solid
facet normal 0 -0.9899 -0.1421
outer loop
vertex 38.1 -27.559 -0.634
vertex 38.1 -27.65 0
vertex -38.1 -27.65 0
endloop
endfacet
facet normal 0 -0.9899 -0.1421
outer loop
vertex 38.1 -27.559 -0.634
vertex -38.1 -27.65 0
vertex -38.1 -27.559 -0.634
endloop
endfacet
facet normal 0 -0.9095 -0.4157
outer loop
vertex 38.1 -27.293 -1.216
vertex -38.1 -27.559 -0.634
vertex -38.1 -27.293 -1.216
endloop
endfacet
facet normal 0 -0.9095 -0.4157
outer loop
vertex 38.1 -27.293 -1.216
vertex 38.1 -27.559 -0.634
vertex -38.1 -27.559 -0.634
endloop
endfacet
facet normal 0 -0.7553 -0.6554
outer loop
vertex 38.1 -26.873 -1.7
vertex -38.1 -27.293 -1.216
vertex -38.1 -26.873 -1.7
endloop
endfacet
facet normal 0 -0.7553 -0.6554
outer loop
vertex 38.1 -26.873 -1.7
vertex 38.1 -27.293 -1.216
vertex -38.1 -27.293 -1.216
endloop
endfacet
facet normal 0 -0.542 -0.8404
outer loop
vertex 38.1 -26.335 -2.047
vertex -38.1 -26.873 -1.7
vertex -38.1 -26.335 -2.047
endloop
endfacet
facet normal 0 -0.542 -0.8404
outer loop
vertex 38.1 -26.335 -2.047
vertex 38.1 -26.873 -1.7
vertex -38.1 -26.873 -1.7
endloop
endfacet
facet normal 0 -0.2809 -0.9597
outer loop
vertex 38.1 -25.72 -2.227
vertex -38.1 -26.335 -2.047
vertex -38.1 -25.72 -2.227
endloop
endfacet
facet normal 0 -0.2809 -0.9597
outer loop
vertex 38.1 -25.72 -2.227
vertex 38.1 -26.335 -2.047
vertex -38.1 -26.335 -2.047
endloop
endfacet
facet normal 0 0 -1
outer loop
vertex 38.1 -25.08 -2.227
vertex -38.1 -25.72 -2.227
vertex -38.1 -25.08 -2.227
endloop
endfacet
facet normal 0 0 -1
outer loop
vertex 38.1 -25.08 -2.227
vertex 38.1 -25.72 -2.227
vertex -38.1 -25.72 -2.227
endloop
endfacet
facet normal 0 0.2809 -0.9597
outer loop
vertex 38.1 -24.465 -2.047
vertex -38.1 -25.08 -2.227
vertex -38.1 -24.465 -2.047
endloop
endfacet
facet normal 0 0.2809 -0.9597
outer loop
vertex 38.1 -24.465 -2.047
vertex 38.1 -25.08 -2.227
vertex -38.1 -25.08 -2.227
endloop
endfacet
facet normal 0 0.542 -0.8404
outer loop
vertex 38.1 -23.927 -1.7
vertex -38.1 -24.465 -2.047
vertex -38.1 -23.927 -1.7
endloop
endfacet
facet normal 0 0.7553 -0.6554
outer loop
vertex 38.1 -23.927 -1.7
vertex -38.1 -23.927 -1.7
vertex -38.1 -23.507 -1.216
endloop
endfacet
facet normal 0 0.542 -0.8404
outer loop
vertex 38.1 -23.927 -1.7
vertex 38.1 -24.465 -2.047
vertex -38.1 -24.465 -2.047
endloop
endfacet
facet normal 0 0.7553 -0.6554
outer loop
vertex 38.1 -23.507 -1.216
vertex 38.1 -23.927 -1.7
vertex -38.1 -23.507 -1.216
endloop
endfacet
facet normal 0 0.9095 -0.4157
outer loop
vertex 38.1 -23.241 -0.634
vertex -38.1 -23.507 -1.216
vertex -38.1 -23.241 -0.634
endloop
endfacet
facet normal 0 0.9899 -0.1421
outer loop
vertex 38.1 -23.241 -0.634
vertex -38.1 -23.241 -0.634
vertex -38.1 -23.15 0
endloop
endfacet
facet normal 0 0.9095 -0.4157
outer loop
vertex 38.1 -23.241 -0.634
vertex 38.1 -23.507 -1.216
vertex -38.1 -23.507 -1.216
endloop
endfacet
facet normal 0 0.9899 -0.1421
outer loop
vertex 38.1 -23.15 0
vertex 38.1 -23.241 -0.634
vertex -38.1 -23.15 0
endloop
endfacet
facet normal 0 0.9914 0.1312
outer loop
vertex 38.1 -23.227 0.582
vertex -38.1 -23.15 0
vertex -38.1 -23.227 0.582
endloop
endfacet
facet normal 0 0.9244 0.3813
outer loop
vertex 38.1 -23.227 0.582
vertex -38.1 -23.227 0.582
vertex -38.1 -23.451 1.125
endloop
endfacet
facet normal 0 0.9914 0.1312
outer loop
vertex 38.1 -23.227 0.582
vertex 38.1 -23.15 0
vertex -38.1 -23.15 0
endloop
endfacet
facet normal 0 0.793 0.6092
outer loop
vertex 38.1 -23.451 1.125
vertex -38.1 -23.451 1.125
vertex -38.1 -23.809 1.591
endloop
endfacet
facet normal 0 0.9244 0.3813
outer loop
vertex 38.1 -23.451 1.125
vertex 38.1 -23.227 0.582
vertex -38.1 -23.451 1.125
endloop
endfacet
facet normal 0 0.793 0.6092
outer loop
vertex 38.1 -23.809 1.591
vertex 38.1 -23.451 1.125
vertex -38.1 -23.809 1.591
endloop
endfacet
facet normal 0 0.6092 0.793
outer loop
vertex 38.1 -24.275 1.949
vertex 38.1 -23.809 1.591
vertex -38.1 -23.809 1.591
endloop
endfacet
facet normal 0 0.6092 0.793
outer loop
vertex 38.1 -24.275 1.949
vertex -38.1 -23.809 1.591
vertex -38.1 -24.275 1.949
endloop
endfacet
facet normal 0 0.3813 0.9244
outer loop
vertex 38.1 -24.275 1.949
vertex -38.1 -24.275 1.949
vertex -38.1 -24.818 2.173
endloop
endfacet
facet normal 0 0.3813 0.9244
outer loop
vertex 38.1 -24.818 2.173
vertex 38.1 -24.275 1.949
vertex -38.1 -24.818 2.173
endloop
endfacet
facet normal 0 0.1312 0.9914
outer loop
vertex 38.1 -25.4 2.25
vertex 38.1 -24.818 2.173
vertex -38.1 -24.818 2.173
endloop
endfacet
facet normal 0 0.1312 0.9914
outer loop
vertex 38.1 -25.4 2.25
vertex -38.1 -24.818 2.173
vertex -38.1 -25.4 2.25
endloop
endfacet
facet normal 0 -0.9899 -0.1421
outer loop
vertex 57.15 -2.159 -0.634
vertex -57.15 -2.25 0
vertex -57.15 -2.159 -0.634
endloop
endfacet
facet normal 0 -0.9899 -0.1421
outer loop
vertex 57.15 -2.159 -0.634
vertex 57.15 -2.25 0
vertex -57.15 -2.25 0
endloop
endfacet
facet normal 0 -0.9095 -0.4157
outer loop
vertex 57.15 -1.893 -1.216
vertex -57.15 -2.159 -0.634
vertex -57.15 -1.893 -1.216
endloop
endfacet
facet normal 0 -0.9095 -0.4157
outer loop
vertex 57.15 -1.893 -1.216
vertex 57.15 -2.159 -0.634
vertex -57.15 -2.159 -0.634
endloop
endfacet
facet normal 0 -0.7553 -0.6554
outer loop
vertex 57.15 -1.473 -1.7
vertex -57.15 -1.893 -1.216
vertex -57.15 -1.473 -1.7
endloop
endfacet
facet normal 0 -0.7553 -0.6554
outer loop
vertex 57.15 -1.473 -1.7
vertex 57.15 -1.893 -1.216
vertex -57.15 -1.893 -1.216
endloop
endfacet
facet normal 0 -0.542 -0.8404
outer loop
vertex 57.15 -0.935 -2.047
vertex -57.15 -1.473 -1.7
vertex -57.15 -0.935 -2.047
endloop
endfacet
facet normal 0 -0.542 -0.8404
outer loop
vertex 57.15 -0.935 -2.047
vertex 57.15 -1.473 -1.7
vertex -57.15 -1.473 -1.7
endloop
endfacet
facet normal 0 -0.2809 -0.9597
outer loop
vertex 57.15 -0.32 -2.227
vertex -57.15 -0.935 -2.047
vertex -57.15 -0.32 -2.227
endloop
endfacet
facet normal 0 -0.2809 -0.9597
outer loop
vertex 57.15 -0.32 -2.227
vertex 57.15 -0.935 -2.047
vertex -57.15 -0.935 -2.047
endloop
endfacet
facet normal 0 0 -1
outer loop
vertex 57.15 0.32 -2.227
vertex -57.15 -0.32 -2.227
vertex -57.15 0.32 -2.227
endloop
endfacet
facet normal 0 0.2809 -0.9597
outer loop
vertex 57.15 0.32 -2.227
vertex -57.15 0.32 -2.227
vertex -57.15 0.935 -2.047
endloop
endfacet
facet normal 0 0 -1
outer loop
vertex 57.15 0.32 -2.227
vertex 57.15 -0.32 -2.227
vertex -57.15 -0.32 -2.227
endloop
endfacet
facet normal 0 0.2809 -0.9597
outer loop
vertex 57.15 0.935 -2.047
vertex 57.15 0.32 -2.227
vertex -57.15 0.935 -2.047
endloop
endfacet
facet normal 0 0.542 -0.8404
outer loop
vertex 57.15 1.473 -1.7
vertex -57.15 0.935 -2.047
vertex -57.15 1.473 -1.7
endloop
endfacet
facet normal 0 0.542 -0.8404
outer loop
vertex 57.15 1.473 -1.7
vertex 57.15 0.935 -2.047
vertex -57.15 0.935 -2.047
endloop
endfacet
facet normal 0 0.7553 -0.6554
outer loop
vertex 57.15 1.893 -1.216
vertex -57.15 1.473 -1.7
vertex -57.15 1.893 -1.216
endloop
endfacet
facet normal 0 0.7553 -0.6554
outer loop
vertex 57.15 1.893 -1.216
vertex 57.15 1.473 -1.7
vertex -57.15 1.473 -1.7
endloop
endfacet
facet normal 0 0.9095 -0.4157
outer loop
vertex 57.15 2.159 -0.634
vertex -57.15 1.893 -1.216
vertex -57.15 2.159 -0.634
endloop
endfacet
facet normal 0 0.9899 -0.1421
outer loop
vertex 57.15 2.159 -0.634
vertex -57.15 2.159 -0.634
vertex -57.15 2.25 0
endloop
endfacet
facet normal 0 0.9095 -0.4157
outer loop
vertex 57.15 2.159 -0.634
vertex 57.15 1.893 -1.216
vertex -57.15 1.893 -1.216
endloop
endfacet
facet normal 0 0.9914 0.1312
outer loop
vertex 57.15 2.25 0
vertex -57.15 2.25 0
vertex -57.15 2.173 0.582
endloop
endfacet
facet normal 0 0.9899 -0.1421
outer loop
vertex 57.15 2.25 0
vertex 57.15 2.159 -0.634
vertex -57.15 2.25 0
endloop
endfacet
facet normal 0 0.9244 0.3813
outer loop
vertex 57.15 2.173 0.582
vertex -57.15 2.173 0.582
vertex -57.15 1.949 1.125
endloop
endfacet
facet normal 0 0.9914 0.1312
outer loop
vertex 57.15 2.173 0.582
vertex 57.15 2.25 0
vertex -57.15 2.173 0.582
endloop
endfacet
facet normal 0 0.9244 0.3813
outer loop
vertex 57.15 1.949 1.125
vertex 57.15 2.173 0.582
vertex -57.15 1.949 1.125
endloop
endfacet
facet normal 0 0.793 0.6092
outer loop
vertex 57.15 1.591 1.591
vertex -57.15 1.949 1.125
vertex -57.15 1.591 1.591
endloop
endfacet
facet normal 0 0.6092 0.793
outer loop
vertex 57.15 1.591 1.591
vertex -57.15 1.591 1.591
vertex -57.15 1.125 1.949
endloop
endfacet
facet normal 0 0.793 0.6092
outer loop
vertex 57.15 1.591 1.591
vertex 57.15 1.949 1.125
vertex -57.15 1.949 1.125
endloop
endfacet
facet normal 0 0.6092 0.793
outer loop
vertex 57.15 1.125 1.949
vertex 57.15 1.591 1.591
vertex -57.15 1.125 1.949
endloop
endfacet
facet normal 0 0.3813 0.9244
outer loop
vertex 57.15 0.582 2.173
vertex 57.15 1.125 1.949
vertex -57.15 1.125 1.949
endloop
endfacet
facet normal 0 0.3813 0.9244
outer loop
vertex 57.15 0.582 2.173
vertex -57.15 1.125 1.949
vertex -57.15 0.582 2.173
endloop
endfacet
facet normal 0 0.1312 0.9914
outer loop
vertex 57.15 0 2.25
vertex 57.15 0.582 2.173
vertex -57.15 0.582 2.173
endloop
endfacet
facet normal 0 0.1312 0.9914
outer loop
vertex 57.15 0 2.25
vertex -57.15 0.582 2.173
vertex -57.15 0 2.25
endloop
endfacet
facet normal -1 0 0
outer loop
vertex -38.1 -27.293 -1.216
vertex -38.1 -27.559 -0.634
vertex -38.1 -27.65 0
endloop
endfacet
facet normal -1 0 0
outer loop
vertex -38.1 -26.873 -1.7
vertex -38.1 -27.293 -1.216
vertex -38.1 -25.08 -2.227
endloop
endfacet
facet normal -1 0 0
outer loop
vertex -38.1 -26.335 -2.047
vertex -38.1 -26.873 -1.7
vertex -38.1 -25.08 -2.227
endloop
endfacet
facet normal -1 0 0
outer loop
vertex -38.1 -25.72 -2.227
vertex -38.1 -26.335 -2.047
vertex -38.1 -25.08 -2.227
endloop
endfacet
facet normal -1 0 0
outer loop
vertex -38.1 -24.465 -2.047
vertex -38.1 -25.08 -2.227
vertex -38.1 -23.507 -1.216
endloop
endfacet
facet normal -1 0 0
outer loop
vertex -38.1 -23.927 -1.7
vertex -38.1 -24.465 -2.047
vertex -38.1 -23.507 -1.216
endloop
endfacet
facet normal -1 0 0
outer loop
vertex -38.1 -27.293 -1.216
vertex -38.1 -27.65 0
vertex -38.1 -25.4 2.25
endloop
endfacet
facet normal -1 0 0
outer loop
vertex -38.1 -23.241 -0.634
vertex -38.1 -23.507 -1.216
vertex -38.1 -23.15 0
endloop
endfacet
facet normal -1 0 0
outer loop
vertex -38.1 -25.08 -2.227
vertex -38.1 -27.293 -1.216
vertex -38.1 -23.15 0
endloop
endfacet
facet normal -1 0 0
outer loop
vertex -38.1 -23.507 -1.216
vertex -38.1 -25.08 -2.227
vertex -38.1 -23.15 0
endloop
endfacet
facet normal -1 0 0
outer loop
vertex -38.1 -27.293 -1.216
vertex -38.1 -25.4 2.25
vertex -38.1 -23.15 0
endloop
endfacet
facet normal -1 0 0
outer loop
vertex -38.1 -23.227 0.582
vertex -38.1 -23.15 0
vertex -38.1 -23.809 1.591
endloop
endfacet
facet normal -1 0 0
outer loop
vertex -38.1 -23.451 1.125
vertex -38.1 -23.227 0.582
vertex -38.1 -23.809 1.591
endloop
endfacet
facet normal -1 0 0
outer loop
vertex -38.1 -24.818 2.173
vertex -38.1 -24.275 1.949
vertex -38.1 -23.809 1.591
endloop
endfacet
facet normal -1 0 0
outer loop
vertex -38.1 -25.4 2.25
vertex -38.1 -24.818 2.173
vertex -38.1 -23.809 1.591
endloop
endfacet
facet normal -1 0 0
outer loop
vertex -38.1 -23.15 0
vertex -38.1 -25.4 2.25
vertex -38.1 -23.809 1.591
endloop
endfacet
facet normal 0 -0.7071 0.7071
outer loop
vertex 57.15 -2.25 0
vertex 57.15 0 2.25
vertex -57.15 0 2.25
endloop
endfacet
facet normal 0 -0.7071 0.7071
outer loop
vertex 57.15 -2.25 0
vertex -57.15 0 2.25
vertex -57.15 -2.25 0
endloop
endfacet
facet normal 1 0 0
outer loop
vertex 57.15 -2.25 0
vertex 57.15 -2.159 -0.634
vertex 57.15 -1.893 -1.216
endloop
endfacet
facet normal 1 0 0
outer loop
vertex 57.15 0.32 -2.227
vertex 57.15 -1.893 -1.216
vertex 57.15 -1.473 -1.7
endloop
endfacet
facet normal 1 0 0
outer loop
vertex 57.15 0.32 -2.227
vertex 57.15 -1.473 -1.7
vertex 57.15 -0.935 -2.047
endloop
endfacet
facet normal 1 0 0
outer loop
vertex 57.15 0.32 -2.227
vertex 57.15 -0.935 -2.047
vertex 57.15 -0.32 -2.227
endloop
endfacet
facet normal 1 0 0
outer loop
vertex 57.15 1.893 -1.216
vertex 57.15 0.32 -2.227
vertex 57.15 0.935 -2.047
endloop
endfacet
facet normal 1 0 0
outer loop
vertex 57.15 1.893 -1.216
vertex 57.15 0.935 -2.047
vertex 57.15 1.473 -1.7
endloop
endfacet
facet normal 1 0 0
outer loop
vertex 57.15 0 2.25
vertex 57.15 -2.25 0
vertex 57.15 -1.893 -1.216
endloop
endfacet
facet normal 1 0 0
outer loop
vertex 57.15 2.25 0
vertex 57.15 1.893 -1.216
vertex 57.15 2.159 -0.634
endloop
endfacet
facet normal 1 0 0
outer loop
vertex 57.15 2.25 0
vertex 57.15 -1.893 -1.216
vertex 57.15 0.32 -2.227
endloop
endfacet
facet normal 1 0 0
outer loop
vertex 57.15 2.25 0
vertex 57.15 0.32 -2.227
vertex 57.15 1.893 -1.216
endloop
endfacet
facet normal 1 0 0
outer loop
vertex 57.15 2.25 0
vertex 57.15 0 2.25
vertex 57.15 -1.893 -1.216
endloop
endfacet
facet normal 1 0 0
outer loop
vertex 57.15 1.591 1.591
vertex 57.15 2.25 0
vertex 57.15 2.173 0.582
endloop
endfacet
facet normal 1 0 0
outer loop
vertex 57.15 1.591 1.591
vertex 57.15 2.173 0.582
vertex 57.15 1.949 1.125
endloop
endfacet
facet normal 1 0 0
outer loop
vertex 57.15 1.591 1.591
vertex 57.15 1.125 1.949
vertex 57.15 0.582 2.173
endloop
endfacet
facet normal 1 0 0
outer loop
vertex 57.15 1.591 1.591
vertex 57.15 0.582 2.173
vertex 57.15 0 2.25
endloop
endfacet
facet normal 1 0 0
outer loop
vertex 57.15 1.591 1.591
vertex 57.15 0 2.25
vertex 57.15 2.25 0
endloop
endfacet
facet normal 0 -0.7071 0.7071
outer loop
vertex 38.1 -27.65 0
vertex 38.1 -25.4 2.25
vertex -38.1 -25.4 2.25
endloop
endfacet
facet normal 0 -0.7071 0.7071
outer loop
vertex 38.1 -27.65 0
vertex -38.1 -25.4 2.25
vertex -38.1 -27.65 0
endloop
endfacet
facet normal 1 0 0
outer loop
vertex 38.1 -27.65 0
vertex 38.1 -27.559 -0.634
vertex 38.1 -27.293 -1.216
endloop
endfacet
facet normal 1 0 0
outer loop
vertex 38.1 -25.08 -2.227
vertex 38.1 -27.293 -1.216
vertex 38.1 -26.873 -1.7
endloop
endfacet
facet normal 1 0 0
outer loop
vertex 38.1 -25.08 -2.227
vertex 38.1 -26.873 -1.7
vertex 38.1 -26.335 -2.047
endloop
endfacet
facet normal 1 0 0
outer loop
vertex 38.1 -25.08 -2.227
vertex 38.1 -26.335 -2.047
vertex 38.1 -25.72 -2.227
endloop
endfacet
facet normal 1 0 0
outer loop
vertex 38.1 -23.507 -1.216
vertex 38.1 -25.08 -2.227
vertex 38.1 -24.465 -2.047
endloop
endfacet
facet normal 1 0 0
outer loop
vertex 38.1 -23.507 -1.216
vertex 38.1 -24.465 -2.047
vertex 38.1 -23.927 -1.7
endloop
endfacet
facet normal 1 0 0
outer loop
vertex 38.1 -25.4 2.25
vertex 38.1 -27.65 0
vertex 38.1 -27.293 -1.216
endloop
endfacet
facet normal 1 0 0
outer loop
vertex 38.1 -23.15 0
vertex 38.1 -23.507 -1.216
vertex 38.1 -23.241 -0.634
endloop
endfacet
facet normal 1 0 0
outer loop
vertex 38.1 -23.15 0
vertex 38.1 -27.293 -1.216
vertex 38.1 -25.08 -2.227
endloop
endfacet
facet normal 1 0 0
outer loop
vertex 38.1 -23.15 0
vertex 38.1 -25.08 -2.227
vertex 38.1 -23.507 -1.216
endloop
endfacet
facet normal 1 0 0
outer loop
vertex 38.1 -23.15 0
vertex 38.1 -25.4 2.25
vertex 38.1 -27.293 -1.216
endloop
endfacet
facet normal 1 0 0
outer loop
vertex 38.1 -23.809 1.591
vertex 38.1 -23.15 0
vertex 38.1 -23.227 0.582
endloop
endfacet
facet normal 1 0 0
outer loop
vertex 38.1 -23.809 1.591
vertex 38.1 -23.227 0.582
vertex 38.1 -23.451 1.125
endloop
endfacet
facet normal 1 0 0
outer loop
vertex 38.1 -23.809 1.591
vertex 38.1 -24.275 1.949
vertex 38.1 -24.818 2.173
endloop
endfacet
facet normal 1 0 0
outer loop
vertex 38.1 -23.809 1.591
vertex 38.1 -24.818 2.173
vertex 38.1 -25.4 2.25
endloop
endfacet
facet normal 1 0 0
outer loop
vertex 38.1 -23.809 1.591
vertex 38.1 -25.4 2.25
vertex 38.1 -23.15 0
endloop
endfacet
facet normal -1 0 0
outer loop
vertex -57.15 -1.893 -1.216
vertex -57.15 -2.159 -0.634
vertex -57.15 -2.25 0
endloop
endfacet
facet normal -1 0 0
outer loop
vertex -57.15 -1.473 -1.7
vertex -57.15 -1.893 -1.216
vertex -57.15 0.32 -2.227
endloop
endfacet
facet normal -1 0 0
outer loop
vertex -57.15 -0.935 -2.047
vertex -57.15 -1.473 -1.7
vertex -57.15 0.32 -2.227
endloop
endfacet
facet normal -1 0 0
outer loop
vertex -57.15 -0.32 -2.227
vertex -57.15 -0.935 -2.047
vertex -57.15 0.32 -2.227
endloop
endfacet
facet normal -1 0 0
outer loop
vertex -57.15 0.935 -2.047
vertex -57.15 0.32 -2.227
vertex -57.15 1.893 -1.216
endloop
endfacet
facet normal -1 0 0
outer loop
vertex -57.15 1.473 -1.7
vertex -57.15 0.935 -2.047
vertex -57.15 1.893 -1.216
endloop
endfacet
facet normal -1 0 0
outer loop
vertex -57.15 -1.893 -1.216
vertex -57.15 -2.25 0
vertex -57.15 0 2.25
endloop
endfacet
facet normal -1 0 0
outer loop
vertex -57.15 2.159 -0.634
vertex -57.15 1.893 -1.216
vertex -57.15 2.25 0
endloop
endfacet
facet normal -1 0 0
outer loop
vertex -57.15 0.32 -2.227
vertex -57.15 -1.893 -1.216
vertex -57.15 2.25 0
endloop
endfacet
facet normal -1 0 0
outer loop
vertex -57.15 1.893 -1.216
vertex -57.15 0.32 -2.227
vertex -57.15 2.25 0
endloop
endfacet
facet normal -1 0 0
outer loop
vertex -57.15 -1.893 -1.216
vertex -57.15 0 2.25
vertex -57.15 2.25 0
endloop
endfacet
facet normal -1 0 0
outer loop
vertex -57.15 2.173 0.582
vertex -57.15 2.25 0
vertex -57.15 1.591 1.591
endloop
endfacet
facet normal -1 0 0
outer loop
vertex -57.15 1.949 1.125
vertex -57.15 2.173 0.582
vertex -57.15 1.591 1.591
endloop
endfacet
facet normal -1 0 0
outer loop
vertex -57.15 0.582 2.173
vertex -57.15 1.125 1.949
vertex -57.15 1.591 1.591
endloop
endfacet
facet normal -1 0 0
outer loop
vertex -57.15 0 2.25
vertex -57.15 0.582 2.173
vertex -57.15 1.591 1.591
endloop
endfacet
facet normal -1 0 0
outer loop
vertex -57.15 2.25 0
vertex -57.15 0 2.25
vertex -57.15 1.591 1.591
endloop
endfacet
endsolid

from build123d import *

# Parameters (mm, degrees)
F1_DEPTH = 57.15
F3_DEPTH = 19.05
F4_DEPTH = 19.05


with BuildPart() as f1:
    # F0 (on Right) → F1 (new body, symmetric)
    with BuildSketch(Plane.YZ):
        with BuildLine():
            ThreePointArc((-2.25, 0), (0, -2.25), (2.25, 0))
            ThreePointArc((2.25, 0), (1.5909902577, 1.5909902577), (0, 2.25))
            Line((0, 2.25), (-2.25, 0))
        make_face()
    extrude(amount=F1_DEPTH, both=True)


with BuildPart() as f2_1:
    # F2: copy of F1
    add(f1.part.moved(Location((0, -25.4, 0))))

    # F3 (cut): a face of the model
    f3_faces = [f2_1.faces().sort_by_distance(p)[0] for p in [
        (57.15, -25.2687064199, -0.1312935801),
    ]]
    extrude(f3_faces, amount=-F3_DEPTH, mode=Mode.SUBTRACT)

    # F4 (cut): a face of the model
    f4_faces = [f2_1.faces().sort_by_distance(p)[0] for p in [
        (-57.15, -25.2687064199, -0.1312935801),
    ]]
    extrude(f4_faces, amount=-F4_DEPTH, mode=Mode.SUBTRACT)


solid = Compound([f1.part, f2_1.part])
